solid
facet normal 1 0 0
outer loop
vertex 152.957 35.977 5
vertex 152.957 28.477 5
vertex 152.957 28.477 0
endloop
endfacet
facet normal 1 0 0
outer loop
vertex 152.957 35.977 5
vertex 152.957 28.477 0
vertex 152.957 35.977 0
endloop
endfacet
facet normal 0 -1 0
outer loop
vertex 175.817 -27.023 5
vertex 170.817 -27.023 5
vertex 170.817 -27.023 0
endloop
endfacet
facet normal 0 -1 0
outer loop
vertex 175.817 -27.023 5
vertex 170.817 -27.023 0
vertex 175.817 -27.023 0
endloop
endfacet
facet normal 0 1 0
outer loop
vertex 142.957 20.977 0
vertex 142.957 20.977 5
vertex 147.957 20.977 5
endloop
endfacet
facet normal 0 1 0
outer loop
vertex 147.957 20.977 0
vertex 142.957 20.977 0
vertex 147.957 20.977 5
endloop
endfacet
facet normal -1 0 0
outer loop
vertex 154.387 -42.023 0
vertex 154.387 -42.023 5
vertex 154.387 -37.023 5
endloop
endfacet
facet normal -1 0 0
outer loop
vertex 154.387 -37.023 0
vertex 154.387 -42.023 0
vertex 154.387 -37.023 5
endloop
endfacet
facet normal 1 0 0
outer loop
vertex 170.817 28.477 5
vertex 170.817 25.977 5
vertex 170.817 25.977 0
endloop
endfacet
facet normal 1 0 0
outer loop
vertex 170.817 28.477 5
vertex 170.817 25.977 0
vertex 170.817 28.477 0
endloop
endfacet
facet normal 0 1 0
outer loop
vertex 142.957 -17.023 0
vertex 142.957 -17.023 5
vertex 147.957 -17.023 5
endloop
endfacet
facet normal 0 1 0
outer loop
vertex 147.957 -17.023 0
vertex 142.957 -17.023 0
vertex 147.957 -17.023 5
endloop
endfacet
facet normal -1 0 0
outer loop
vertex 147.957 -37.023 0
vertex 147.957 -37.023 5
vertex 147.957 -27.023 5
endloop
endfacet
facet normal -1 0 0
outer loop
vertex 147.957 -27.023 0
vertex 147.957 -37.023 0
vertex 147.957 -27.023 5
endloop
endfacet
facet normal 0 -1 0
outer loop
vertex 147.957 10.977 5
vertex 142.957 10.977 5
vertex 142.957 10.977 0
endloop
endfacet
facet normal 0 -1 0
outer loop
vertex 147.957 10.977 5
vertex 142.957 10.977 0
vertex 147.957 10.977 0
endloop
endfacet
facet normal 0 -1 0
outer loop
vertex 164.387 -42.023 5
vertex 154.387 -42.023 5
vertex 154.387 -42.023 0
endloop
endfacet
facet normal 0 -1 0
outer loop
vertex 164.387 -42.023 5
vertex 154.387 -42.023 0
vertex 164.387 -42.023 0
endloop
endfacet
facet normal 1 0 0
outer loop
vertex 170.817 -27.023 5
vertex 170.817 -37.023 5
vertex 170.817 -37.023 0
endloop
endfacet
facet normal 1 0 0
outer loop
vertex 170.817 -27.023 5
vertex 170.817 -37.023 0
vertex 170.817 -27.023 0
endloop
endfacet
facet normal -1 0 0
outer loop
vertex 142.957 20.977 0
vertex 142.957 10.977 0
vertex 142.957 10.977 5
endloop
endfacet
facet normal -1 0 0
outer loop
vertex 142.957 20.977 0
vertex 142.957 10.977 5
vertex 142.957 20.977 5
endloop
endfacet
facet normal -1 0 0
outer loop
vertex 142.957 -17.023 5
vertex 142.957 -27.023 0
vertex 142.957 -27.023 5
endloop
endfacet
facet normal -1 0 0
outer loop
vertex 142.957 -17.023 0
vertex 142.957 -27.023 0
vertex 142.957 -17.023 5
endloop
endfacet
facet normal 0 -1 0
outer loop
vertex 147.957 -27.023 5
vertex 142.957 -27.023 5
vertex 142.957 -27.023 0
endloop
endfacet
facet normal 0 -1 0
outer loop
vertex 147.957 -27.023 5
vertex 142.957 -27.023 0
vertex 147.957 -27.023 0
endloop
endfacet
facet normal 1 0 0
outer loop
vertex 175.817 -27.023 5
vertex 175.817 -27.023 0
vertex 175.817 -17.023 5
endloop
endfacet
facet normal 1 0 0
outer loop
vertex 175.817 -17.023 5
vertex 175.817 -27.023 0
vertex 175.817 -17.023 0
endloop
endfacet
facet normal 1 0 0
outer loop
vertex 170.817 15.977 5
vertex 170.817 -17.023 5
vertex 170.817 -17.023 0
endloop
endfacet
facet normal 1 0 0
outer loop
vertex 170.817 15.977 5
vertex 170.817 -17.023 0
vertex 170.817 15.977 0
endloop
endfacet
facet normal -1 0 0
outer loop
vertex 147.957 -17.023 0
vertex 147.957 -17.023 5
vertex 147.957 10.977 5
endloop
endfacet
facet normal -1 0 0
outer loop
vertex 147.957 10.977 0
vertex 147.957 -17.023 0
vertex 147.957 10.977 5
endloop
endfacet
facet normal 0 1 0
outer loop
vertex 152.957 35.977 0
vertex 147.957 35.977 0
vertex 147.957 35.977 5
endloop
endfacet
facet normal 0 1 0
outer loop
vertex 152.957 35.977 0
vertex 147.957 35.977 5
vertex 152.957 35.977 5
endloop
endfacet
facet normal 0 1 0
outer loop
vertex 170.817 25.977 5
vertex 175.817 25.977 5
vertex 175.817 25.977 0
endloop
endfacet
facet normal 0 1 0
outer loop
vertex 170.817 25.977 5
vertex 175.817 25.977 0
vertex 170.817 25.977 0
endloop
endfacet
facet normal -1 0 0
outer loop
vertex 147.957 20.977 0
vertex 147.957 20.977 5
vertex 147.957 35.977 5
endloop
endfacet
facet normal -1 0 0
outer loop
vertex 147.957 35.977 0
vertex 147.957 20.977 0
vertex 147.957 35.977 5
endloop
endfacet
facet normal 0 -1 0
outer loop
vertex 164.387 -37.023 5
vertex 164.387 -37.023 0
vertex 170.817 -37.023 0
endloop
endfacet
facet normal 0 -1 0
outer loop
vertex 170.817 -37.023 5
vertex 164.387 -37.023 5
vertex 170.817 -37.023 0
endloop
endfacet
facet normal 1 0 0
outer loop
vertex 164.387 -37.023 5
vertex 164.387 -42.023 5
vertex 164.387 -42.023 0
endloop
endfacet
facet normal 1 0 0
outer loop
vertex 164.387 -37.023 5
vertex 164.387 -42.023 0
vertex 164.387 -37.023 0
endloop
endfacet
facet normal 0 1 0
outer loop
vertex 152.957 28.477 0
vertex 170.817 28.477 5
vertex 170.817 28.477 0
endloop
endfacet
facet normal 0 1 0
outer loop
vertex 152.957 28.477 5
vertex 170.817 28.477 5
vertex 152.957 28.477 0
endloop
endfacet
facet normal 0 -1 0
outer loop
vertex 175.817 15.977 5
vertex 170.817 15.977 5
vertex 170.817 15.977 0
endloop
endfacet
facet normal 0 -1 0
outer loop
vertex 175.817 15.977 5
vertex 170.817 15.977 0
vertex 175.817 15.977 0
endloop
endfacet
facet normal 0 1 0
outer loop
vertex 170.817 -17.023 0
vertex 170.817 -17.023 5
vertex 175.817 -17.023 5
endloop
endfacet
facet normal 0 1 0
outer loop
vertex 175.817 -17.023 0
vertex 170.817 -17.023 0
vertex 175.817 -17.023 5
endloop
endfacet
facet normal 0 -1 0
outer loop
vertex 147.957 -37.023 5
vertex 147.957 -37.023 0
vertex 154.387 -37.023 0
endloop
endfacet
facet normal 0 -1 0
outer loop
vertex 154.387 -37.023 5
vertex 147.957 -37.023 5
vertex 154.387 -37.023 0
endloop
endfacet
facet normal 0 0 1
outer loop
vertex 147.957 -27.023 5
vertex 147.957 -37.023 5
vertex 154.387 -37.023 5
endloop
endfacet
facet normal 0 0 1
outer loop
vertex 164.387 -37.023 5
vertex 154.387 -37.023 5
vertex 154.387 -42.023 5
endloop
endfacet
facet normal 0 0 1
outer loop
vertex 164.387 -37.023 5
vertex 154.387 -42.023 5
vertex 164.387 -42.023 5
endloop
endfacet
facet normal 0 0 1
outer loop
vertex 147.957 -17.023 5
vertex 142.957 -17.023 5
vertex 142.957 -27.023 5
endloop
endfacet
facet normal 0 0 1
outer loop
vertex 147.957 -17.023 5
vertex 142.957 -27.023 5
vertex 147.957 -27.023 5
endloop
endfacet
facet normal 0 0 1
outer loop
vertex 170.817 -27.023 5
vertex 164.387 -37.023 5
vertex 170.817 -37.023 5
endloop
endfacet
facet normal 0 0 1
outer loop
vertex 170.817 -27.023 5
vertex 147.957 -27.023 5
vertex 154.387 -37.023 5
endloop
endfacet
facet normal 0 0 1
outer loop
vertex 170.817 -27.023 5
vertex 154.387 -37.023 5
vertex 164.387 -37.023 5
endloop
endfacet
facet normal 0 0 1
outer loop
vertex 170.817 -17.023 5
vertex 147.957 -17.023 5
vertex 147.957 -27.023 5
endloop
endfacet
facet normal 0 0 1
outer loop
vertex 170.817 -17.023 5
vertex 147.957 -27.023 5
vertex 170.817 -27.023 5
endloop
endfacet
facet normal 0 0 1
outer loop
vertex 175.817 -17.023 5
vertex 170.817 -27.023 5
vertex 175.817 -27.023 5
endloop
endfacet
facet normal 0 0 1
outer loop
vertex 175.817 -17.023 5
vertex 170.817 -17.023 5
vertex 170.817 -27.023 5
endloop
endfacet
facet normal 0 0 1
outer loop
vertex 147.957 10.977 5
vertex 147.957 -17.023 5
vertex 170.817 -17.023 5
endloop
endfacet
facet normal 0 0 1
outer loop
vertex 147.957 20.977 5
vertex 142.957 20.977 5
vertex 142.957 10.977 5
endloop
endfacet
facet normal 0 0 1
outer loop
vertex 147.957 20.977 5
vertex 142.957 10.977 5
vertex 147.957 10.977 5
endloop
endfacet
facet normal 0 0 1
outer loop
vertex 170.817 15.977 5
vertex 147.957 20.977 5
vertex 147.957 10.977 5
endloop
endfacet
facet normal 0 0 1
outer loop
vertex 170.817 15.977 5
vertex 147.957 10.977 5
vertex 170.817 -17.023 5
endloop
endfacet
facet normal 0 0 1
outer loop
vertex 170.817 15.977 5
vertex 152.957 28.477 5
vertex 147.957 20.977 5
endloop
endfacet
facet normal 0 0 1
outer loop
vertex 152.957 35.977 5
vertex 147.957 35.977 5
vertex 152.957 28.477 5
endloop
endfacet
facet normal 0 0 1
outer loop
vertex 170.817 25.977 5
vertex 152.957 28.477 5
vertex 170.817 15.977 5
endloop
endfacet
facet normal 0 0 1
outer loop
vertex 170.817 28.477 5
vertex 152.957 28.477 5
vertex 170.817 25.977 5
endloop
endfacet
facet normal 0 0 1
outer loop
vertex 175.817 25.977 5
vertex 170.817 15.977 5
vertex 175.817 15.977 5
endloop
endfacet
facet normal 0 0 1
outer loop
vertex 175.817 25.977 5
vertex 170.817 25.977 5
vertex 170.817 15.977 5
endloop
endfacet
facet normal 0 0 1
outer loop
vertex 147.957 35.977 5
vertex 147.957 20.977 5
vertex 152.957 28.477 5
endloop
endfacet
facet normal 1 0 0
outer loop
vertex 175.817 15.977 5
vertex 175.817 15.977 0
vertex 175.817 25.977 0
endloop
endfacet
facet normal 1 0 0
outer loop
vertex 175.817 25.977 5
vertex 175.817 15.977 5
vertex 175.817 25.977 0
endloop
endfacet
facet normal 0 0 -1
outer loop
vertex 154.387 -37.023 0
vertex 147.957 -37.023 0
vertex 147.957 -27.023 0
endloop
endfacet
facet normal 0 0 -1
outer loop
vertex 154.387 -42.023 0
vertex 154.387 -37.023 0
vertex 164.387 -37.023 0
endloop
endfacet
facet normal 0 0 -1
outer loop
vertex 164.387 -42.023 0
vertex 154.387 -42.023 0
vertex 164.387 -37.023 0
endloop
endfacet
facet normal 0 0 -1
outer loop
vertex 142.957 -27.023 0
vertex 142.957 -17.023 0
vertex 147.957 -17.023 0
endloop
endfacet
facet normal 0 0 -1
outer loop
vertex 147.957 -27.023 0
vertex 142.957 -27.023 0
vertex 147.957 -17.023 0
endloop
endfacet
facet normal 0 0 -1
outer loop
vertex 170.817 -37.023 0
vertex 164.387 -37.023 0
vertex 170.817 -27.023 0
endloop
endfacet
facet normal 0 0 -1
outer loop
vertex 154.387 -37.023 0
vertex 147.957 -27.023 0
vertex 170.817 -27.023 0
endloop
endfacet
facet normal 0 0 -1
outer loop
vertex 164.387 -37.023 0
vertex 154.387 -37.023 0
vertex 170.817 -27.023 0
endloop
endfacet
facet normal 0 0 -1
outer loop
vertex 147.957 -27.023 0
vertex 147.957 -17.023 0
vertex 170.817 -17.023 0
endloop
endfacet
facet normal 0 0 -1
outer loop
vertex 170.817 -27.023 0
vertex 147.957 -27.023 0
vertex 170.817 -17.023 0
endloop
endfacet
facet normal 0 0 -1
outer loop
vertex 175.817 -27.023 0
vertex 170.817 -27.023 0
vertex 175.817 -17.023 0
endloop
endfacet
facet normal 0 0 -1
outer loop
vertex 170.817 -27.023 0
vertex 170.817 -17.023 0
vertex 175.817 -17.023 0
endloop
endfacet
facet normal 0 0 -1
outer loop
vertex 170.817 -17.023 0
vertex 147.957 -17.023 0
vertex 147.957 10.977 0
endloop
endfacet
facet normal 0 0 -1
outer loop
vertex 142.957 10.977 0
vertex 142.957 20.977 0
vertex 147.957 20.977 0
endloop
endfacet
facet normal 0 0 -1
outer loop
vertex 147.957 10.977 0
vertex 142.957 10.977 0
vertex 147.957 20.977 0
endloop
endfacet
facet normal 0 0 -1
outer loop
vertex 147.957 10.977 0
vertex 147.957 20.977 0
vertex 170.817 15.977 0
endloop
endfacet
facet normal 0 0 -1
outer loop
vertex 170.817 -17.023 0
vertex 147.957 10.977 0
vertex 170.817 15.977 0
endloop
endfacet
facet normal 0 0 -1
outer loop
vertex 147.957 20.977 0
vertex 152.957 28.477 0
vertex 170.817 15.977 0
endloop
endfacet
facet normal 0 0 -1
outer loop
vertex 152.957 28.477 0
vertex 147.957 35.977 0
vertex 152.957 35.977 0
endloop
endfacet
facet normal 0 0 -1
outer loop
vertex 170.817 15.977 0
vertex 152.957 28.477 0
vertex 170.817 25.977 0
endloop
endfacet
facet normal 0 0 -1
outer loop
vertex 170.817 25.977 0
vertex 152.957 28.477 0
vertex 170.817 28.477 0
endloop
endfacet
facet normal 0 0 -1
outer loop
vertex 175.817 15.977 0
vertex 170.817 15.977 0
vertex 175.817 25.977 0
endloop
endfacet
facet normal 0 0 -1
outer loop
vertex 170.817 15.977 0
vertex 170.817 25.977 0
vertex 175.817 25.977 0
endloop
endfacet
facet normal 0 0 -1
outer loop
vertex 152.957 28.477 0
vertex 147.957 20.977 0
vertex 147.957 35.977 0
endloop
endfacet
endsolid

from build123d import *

# Parameters (mm, degrees)
ESQUISSE1_W             = 32.86
ESQUISSE1_H             = 73
BOSS_EXTRU_1_DEPTH      = 5
ESQUISSE2_W             = 5
ESQUISSE2_H             = 33
ESQUISSE2_H_2           = 15
ESQUISSE2_H_3           = 10
ESQUISSE2_H_4           = 28
ENL_V_MAT_EXTRU_1_DEPTH = 5
ESQUISSE3_W             = 10
ESQUISSE3_H             = 5
BOSS_EXTRU_2_DEPTH      = 5


with BuildPart() as part:
    # Esquisse1 → Boss.-Extru.1 (new body)
    with BuildSketch(Plane.XY):
        with Locations((159.387093212, -0.522583191)):
            Rectangle(ESQUISSE1_W, ESQUISSE1_H)
    extrude(amount=BOSS_EXTRU_1_DEPTH)

    # Esquisse2 → Enlèv. mat.-Extru.1 (cut)
    with BuildSketch(Plane.XY.offset(5)):
        Polygon((170.817093212, 25.977416809), (170.817093212, 28.477416809), (152.957093212, 28.477416809), (152.957093212, 35.977416809), (175.817093212, 35.977416809), (175.817093212, 25.977416809), align=None)
        with Locations((173.317093212, -0.522583191)):
            Rectangle(ESQUISSE2_W, ESQUISSE2_H)
        with Locations((145.457093212, 28.477416809)):
            Rectangle(ESQUISSE2_W, ESQUISSE2_H_2)
        with Locations((173.317093212, -32.022583191)):
            Rectangle(ESQUISSE2_W, ESQUISSE2_H_3)
        with Locations((145.457093212, -32.022583191)):
            Rectangle(ESQUISSE2_W, ESQUISSE2_H_3)
        with Locations((145.457093212, -3.022583191)):
            Rectangle(ESQUISSE2_W, ESQUISSE2_H_4)
    extrude(amount=-ENL_V_MAT_EXTRU_1_DEPTH, mode=Mode.SUBTRACT)

    # Esquisse3 → Boss.-Extru.2 (add)
    with BuildSketch(Plane.XY.offset(5)):
        with Locations((159.387093212, -39.522583191)):
            Rectangle(ESQUISSE3_W, ESQUISSE3_H)
    extrude(amount=-BOSS_EXTRU_2_DEPTH)


solid = part.part
